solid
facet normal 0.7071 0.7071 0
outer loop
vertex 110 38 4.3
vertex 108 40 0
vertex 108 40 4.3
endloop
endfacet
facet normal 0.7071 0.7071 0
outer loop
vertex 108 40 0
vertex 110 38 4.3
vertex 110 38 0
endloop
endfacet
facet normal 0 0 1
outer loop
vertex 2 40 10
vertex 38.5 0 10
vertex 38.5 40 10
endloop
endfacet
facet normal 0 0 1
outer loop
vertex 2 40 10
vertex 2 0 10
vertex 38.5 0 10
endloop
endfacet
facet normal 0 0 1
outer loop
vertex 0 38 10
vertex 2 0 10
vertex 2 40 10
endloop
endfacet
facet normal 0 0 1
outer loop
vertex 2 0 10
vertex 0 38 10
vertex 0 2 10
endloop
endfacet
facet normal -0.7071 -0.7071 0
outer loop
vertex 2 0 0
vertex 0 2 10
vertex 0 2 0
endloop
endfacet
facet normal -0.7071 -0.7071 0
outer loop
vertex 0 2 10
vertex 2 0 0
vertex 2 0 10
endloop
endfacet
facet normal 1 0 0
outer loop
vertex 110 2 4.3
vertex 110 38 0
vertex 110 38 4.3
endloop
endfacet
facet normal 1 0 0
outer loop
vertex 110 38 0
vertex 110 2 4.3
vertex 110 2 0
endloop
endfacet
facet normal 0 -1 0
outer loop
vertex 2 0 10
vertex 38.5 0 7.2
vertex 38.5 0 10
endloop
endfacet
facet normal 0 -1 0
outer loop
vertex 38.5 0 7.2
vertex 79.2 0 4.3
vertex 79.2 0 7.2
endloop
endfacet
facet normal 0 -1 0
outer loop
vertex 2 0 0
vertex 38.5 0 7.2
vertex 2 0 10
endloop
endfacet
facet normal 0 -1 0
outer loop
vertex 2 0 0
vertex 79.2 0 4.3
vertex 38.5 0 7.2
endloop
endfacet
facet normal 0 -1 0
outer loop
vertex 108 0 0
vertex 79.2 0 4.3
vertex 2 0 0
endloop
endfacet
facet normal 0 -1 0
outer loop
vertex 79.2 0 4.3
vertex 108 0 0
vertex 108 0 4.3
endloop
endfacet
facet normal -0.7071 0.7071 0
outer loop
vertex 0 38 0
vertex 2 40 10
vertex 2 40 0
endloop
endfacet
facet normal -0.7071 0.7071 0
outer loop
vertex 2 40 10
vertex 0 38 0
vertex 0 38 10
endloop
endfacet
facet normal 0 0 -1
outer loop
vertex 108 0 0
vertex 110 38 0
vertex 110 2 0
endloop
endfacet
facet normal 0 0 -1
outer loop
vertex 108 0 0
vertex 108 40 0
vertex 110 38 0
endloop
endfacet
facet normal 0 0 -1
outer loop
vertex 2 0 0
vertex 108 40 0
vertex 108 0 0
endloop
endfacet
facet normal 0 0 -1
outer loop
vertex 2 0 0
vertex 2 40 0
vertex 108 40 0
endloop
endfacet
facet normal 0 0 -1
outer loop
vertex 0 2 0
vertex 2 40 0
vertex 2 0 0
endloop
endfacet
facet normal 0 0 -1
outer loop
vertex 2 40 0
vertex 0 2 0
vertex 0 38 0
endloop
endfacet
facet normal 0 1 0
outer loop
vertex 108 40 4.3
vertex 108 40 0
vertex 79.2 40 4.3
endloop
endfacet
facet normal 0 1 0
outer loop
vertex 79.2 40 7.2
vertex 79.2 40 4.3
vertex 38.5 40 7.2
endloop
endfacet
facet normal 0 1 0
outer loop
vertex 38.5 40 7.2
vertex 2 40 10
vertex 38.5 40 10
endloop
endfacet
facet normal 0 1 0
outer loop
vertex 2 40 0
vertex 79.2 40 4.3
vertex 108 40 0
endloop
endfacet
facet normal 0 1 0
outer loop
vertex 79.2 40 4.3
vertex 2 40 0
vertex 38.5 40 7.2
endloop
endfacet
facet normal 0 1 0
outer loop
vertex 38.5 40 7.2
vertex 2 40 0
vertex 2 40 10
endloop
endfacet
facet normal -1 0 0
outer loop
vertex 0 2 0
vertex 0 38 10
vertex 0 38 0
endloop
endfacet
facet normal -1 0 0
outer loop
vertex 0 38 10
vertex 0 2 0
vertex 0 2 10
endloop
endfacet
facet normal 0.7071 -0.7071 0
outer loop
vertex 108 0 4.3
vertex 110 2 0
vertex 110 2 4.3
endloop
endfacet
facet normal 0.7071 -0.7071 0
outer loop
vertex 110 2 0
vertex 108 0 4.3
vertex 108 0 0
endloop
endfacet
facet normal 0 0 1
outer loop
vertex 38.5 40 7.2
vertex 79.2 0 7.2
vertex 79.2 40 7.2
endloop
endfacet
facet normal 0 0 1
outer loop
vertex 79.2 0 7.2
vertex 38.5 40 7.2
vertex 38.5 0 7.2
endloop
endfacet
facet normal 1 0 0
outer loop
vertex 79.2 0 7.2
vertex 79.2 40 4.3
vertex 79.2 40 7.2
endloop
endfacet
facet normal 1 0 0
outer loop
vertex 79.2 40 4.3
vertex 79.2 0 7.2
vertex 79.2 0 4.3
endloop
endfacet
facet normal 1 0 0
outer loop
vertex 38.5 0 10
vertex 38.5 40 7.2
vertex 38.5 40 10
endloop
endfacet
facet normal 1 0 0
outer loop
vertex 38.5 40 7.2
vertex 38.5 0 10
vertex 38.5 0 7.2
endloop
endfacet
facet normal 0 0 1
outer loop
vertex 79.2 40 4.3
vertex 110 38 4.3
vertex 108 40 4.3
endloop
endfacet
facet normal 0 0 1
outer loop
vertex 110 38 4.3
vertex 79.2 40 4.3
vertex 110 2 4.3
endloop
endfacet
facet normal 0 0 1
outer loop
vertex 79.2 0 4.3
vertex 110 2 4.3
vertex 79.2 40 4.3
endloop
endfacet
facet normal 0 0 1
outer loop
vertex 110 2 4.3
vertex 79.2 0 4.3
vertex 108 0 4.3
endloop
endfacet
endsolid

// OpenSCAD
$fn = 32;

// ----------------------------------------------------------------------
// Stepped bar: twostep, 110 x 40 x 10/4.3 mm
// ----------------------------------------------------------------------

// --- parameters (mm) ---
bar_l = 110;              // bar length, X
bar_w = 40;               // bar width, Y
plate_t = 10;             // thickness of the thick zone, Z
thin_t = 4.3;             // thickness of the thin zone
corner_c = 2;             // corner chamfer of the bar
step_cut = 5.7;           // material removed from the thin zone
stair1_x = 38.5;          // position of the first stair
stair2_x = 79.2;          // position of the second stair
mid_t = 7.2;              // thickness of the middle zone
depth_1 = 2.8;            // depth of cut 1 from the top face
depth_2 = 5.7;            // depth of cut 2 from the top face

profile = [[2, 0], [108, 0], [110, 2], [110, 38], [108, 40], [2, 40], [0, 38], [0, 2]];  // primary outline, 8 points, counter clockwise
void_1 = [[38.5, -1], [79.2, -1], [79.2, 41], [38.5, 41]];  // first stair, 4 points
void_2 = [[79.2, -1], [111, -1], [111, 41], [79.2, 41]];  // second stair, 4 points

// --- the one profile operation ---
difference() {
  linear_extrude(height = plate_t) polygon(points = profile);
  translate([0, 0, plate_t - depth_1])
    linear_extrude(height = depth_1 + 1) polygon(points = void_1);
  translate([0, 0, plate_t - depth_2])
    linear_extrude(height = depth_2 + 1) polygon(points = void_2);
}
